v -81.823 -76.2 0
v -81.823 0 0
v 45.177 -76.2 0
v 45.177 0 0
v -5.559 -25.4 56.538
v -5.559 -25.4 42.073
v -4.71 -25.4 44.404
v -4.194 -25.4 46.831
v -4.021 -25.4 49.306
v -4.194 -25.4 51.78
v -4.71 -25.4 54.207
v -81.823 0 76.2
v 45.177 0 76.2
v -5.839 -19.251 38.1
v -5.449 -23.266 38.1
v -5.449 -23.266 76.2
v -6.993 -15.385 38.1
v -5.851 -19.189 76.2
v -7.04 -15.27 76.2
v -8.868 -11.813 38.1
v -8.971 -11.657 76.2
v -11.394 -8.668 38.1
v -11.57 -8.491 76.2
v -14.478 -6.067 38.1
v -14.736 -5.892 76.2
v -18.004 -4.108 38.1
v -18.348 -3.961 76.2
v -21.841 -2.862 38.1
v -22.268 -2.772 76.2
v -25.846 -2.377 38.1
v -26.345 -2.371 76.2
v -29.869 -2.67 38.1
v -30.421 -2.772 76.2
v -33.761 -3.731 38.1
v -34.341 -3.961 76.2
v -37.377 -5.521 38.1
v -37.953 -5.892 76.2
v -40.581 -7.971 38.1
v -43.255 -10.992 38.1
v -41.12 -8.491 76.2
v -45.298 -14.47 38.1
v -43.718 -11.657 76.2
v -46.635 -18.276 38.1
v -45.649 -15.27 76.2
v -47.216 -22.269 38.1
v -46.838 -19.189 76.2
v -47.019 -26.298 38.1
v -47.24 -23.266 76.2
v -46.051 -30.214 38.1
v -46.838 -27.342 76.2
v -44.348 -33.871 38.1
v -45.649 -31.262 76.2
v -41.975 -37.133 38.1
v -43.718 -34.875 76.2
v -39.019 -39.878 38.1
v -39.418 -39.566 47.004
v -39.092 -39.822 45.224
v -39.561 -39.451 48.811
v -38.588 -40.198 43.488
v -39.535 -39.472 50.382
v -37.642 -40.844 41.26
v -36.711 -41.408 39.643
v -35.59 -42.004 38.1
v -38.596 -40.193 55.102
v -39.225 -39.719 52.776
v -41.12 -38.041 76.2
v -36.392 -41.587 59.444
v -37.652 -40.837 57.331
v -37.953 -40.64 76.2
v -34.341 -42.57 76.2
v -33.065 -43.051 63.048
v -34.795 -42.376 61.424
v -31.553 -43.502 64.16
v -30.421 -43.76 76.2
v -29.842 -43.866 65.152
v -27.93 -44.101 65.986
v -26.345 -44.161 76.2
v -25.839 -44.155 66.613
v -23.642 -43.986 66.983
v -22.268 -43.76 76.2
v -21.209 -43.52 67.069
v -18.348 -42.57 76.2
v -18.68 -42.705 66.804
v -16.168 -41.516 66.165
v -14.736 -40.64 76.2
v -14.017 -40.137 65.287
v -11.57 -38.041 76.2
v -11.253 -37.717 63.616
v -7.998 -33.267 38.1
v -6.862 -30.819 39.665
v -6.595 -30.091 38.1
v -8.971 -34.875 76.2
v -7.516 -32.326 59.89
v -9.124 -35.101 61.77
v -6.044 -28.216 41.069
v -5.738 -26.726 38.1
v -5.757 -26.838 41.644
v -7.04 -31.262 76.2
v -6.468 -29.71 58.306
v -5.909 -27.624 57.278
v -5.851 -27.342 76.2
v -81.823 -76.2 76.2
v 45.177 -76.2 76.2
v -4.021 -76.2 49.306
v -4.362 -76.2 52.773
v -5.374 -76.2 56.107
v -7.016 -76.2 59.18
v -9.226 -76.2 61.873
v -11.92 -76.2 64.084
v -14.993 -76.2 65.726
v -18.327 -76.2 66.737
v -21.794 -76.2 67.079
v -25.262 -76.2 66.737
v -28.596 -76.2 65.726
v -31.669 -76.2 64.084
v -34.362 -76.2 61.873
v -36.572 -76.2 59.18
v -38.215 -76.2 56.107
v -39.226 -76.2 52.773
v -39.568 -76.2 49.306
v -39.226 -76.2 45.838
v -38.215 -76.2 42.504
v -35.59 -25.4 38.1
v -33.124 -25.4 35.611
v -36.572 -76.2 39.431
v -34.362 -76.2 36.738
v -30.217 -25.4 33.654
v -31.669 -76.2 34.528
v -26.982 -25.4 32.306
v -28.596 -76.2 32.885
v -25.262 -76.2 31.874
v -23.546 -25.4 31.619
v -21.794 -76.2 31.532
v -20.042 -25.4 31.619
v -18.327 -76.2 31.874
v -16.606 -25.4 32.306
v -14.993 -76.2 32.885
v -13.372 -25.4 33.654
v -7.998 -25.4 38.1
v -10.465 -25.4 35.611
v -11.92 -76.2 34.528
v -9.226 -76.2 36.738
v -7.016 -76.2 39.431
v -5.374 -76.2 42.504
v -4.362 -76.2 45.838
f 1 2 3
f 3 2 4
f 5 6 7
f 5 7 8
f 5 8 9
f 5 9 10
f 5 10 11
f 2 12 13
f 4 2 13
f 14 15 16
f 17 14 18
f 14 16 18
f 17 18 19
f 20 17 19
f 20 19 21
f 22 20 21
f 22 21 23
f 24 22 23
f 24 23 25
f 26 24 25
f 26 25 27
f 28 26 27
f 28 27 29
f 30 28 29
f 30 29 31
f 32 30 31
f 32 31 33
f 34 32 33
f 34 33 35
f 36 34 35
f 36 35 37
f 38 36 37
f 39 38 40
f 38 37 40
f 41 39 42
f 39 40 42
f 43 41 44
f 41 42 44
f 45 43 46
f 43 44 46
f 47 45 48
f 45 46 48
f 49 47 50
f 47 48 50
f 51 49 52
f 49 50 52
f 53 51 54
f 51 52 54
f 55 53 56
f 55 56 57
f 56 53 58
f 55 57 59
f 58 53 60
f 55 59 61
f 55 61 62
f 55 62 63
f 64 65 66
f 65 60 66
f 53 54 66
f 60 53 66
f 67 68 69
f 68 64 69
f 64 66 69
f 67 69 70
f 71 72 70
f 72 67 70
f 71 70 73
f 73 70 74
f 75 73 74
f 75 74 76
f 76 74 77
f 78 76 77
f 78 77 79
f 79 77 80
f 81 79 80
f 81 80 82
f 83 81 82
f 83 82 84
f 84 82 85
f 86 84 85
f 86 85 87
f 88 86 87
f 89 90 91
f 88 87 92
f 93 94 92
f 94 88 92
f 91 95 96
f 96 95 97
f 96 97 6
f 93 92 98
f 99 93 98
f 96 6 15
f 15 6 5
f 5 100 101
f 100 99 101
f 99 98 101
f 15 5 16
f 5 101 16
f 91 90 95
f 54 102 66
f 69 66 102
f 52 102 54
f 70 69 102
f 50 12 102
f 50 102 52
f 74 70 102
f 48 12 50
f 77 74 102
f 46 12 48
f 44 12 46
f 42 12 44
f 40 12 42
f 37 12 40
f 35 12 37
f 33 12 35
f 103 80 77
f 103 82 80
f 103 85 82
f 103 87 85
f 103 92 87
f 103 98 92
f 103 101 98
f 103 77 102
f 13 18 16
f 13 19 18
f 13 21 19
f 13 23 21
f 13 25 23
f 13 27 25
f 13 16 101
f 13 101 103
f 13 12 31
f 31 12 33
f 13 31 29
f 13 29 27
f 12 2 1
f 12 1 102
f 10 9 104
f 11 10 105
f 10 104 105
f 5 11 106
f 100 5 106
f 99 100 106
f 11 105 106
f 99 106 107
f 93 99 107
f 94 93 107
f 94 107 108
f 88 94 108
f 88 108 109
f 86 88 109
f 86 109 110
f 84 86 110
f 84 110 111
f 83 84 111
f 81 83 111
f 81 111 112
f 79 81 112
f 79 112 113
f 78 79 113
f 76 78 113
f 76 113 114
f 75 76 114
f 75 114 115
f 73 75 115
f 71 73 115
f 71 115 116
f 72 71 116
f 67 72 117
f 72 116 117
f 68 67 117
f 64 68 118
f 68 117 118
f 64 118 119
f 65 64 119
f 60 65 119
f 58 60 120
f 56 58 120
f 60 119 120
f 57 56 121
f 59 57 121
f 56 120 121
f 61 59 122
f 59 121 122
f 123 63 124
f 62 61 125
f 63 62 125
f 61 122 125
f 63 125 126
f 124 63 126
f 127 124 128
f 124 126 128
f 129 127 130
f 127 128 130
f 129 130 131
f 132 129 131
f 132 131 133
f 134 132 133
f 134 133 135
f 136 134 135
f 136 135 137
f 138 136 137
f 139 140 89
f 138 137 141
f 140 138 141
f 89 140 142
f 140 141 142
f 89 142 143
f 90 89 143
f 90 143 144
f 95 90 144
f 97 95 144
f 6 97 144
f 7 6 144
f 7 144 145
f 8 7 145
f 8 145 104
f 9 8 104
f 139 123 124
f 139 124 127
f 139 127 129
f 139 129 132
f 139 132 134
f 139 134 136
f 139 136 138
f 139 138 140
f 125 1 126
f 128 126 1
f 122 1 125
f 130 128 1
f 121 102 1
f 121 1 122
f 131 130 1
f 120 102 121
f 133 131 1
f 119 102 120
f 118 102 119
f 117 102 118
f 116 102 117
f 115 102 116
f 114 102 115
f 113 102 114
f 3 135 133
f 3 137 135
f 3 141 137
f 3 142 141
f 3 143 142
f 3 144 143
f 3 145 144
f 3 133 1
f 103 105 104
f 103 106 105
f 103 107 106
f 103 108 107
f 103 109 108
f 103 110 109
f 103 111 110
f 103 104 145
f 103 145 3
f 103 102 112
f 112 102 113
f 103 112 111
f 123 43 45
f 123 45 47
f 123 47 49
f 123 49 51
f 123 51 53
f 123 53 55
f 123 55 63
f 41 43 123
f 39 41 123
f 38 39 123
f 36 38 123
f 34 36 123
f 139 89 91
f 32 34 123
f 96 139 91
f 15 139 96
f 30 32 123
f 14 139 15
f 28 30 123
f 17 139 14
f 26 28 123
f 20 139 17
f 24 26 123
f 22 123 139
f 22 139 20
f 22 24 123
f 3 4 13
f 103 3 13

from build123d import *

# Parameters (mm, degrees)
F0_W     = 127
F0_H     = 76.2
F1_DEPTH = 76.2
F2_R     = 20.895154
F3_DEPTH = 38.1
F4_R     = 17.773402
F5_DEPTH = 50.8


with BuildPart() as f1:
    # F0 (on Front) → F1 (new body)
    with BuildSketch(Plane.XZ):
        with Locations((-18.322727, 38.1)):
            Rectangle(F0_W, F0_H)
    extrude(amount=F1_DEPTH)

    # F2 (on face) → F3 (cut)
    with BuildSketch(Plane.XY.offset(76.2)):
        with Locations((-26.344616, -23.265893)):
            Circle(F2_R)
    extrude(amount=-F3_DEPTH, mode=Mode.SUBTRACT)

    # F4 (on face) → F5 (cut)
    with BuildSketch(Plane.XZ.offset(76.2)):
        with Locations((-21.794144, 49.305573)):
            Circle(F4_R)
    extrude(amount=-F5_DEPTH, mode=Mode.SUBTRACT)


solid = f1.part
